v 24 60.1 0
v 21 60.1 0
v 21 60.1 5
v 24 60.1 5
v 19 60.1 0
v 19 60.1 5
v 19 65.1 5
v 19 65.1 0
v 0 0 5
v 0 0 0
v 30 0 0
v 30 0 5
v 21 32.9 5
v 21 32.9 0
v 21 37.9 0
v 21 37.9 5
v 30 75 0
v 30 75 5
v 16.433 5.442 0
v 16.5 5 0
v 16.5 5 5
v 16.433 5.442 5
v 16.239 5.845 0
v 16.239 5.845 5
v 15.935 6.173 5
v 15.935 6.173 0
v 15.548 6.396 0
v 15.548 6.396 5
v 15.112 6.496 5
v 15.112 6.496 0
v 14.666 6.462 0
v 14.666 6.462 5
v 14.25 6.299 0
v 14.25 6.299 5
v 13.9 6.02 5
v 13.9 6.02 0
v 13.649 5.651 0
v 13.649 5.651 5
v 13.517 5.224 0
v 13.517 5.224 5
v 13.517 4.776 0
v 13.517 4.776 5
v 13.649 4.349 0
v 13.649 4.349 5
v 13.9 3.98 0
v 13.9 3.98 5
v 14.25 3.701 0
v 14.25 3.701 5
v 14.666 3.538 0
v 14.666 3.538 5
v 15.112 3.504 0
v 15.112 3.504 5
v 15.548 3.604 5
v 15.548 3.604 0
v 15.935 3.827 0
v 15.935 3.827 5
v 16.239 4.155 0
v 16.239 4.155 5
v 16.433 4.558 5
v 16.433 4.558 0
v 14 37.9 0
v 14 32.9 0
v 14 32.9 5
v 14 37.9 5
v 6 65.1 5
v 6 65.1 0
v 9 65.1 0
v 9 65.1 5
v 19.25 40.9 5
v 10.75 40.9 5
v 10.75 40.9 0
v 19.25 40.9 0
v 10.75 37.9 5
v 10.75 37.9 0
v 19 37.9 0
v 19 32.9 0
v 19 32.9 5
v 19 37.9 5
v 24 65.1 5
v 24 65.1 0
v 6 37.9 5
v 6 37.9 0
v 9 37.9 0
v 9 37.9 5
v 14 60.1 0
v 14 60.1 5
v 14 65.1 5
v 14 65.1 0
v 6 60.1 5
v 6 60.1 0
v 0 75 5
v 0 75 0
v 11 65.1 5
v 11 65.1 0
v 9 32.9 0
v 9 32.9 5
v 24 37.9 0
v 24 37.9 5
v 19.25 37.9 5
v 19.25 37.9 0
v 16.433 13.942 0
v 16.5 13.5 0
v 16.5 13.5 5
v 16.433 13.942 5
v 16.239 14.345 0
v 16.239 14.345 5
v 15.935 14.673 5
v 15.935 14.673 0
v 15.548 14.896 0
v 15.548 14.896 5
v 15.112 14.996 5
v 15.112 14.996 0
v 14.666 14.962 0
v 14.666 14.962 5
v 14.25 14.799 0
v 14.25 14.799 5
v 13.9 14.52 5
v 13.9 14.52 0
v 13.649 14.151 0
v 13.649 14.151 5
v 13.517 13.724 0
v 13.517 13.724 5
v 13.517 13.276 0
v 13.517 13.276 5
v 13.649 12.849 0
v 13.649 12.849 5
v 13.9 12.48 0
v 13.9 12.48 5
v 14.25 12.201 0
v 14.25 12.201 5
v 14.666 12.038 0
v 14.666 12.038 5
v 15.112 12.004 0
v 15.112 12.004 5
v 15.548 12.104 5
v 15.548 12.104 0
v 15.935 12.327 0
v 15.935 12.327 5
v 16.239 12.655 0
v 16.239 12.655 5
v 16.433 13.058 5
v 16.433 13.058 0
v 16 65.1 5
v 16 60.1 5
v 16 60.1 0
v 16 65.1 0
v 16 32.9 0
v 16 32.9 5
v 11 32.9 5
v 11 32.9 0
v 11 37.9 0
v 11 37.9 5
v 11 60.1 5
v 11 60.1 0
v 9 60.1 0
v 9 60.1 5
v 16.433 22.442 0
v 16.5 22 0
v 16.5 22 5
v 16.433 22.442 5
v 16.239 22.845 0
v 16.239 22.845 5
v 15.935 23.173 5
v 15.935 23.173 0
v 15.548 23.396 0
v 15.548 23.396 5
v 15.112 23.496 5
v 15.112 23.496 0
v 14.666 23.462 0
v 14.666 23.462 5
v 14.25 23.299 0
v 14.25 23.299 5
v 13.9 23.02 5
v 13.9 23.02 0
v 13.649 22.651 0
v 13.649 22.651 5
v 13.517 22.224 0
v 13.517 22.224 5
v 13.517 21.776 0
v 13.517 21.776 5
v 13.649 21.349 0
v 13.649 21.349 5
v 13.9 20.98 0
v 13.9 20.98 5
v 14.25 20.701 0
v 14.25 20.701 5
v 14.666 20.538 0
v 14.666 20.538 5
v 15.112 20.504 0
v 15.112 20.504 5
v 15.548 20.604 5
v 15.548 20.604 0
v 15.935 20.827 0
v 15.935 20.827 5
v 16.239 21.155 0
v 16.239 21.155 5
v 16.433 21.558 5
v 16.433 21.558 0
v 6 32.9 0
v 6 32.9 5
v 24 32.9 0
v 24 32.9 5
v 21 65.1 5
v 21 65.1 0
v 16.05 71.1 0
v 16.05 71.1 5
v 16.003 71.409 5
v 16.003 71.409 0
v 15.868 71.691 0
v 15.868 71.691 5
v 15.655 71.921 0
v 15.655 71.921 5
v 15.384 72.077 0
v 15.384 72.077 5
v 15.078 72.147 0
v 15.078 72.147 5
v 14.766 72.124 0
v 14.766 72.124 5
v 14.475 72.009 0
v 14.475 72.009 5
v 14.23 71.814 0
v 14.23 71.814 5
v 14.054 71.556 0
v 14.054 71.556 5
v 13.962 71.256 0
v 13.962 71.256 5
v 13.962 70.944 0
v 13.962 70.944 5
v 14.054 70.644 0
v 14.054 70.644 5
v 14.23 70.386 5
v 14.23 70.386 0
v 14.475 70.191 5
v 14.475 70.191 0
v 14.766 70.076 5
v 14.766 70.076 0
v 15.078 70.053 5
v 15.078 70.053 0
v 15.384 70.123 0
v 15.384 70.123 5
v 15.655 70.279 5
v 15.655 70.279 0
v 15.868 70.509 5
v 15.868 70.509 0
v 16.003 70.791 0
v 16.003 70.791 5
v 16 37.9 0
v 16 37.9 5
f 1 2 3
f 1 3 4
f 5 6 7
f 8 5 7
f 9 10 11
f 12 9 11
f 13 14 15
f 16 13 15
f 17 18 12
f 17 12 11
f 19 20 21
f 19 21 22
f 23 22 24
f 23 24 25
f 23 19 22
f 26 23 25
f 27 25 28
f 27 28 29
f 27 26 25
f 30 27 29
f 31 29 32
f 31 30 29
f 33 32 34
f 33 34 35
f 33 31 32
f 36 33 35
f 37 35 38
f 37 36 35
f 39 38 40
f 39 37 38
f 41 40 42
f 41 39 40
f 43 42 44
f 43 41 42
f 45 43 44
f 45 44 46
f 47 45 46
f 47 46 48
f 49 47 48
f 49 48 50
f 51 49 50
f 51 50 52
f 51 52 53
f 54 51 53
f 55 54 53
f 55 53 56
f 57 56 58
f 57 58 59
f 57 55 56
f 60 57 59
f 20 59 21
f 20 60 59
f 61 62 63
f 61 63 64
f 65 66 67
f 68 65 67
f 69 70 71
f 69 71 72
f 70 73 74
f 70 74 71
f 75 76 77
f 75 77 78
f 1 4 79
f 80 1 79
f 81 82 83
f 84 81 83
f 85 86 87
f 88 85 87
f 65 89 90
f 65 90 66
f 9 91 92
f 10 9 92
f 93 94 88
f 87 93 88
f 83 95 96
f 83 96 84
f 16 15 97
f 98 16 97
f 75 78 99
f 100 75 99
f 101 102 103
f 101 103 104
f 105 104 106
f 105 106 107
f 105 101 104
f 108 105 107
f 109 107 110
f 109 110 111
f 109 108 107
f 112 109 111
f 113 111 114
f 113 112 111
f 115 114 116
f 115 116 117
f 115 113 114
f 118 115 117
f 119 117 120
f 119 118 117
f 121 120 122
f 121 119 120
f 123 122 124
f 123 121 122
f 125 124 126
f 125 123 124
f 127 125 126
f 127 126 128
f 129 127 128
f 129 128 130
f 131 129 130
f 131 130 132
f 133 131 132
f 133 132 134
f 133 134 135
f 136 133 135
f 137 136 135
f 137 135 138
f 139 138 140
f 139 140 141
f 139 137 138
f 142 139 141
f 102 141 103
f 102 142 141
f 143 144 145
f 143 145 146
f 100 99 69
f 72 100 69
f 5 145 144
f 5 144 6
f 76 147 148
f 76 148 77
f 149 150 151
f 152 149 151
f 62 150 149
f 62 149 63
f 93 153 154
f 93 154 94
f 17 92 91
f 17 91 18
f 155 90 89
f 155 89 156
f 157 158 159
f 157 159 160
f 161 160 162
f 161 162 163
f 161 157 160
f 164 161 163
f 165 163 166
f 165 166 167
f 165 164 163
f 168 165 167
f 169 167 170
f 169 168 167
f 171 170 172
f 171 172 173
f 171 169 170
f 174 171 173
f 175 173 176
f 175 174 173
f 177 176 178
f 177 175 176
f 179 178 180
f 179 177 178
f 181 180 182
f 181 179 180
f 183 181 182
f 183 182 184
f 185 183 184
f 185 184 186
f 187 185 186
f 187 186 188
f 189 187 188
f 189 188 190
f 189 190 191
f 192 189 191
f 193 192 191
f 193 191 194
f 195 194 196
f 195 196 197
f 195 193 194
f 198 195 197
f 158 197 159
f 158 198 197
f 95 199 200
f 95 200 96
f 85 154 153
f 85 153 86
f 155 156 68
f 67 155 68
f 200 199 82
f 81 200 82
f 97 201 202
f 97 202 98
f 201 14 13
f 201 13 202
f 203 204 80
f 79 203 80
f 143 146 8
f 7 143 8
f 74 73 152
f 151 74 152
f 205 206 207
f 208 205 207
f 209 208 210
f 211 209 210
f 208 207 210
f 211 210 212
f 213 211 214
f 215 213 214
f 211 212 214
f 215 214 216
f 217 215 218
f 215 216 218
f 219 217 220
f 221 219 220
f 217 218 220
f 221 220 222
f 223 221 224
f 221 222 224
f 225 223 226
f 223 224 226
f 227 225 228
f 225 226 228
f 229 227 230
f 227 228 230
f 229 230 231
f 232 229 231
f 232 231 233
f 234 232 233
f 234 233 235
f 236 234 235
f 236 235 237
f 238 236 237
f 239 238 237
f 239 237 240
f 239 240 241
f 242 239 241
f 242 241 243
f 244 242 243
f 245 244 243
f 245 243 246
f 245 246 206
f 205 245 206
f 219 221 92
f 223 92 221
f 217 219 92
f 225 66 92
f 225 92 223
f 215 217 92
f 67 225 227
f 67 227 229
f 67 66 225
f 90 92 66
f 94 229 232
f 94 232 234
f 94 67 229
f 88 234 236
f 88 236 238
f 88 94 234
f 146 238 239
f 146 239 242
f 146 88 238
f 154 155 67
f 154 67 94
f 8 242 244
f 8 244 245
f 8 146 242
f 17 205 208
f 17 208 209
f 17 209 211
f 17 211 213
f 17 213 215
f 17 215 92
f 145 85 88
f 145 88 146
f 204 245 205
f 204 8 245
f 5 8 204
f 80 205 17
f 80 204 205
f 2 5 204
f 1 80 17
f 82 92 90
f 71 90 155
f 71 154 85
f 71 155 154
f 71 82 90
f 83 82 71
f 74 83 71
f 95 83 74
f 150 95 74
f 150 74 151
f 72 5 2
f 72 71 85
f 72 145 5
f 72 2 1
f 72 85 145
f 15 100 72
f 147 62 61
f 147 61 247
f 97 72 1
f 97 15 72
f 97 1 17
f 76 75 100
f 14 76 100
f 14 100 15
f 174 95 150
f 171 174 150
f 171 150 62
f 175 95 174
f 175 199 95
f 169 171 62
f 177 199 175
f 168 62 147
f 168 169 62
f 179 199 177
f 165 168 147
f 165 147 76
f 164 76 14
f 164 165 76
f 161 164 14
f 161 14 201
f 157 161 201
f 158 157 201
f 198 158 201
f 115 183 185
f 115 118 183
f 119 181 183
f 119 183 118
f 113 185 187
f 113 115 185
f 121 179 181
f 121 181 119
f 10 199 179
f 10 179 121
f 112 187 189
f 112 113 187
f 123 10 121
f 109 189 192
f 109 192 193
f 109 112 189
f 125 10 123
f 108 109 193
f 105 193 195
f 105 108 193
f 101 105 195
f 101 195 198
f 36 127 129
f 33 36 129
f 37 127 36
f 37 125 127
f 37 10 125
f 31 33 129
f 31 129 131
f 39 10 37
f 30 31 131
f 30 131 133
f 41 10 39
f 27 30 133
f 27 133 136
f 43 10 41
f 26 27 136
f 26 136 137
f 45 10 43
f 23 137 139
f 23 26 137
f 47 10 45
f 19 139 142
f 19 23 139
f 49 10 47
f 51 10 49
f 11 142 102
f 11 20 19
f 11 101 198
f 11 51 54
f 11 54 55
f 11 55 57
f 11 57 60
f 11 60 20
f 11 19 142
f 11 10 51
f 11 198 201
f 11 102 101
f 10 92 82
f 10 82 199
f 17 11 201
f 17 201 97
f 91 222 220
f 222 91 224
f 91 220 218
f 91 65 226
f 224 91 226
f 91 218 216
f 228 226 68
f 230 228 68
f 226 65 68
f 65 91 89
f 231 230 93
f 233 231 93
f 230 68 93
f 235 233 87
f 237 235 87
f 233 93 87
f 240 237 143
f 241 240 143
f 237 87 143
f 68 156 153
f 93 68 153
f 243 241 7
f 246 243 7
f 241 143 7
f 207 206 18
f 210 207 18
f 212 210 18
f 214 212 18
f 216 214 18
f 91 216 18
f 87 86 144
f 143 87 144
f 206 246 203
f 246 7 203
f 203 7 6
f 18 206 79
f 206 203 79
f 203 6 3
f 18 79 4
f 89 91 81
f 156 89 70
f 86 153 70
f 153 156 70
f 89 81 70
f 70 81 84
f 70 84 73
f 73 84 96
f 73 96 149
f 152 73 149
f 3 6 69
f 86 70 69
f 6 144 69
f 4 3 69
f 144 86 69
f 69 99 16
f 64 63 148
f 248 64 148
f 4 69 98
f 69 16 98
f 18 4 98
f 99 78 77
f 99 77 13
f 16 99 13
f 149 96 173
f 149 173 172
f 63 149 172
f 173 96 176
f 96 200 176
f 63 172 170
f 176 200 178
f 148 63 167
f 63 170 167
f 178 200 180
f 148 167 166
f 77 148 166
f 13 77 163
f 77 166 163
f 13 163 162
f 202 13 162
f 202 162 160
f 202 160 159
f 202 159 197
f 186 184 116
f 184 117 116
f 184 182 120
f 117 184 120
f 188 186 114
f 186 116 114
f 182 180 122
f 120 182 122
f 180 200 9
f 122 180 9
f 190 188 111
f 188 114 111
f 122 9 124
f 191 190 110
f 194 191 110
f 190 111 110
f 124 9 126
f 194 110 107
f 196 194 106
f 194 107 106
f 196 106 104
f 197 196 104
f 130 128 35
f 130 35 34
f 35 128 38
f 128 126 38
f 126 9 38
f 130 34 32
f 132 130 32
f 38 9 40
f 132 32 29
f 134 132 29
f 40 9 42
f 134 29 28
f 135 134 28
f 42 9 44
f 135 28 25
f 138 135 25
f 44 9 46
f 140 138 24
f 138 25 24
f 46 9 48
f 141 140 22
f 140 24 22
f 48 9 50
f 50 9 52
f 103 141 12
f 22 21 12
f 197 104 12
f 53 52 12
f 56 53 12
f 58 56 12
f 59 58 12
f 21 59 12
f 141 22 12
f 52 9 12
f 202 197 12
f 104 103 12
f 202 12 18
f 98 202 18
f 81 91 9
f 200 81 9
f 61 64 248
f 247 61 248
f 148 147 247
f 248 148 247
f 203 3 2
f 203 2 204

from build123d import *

# Parameters (mm, degrees)
ESQUISSE1_W             = 30
ESQUISSE1_H             = 70
ESQUISSE1_R             = 1.5
ESQUISSE1_W_2           = 3
ESQUISSE1_H_2           = 5
BOSS_EXTRU_1_DEPTH      = 5
ESQUISSE2_W             = 8.5
ESQUISSE2_H             = 3
ENL_V_MAT_EXTRU_1_DEPTH = 5
ESQUISSE3_W             = 30
ESQUISSE3_H             = 5
BOSS_EXTRU_2_DEPTH      = 5
ESQUISSE4_R             = 1.05
ENL_V_MAT_EXTRU_2_DEPTH = 10


with BuildPart() as part:
    # Esquisse1 → Boss.-Extru.1 (new body)
    with BuildSketch(Plane.XY):
        with Locations((15, 35)):
            Rectangle(ESQUISSE1_W, ESQUISSE1_H)
        with Locations((15, 5)):
            Circle(ESQUISSE1_R, mode=Mode.SUBTRACT)
        with Locations((15, 13.5)):
            Circle(ESQUISSE1_R, mode=Mode.SUBTRACT)
        with Locations((15, 22)):
            Circle(ESQUISSE1_R, mode=Mode.SUBTRACT)
        with Locations((12.5, 35.4)):
            Rectangle(ESQUISSE1_W_2, ESQUISSE1_H_2, mode=Mode.SUBTRACT)
        with Locations((7.5, 35.4)):
            Rectangle(ESQUISSE1_W_2, ESQUISSE1_H_2, mode=Mode.SUBTRACT)
        with Locations((17.5, 35.4)):
            Rectangle(ESQUISSE1_W_2, ESQUISSE1_H_2, mode=Mode.SUBTRACT)
        with Locations((22.5, 35.4)):
            Rectangle(ESQUISSE1_W_2, ESQUISSE1_H_2, mode=Mode.SUBTRACT)
        with Locations((22.5, 62.6)):
            Rectangle(ESQUISSE1_W_2, ESQUISSE1_H_2, mode=Mode.SUBTRACT)
        with Locations((17.5, 62.6)):
            Rectangle(ESQUISSE1_W_2, ESQUISSE1_H_2, mode=Mode.SUBTRACT)
        with Locations((12.5, 62.6)):
            Rectangle(ESQUISSE1_W_2, ESQUISSE1_H_2, mode=Mode.SUBTRACT)
        with Locations((7.5, 62.6)):
            Rectangle(ESQUISSE1_W_2, ESQUISSE1_H_2, mode=Mode.SUBTRACT)
    extrude(amount=BOSS_EXTRU_1_DEPTH)

    # Esquisse2 → Enlèv. mat.-Extru.1 (cut)
    with BuildSketch(Plane.XY.offset(5)):
        with Locations((15, 39.4)):
            Rectangle(ESQUISSE2_W, ESQUISSE2_H)
    extrude(amount=-ENL_V_MAT_EXTRU_1_DEPTH, mode=Mode.SUBTRACT)

    # Esquisse3 → Boss.-Extru.2 (add)
    with BuildSketch(Plane(origin=(0, 70, 0), x_dir=(1, 0, 0), z_dir=(0, 1, 0))):
        with Locations((15, -2.5)):
            Rectangle(ESQUISSE3_W, ESQUISSE3_H)
    extrude(amount=BOSS_EXTRU_2_DEPTH)

    # Esquisse4 → Enlèv. mat.-Extru.2 (cut)
    with BuildSketch(Plane.XY.offset(5)):
        with Locations((15, 71.1)):
            Circle(ESQUISSE4_R)
    extrude(amount=-ENL_V_MAT_EXTRU_2_DEPTH, mode=Mode.SUBTRACT)


solid = part.part
